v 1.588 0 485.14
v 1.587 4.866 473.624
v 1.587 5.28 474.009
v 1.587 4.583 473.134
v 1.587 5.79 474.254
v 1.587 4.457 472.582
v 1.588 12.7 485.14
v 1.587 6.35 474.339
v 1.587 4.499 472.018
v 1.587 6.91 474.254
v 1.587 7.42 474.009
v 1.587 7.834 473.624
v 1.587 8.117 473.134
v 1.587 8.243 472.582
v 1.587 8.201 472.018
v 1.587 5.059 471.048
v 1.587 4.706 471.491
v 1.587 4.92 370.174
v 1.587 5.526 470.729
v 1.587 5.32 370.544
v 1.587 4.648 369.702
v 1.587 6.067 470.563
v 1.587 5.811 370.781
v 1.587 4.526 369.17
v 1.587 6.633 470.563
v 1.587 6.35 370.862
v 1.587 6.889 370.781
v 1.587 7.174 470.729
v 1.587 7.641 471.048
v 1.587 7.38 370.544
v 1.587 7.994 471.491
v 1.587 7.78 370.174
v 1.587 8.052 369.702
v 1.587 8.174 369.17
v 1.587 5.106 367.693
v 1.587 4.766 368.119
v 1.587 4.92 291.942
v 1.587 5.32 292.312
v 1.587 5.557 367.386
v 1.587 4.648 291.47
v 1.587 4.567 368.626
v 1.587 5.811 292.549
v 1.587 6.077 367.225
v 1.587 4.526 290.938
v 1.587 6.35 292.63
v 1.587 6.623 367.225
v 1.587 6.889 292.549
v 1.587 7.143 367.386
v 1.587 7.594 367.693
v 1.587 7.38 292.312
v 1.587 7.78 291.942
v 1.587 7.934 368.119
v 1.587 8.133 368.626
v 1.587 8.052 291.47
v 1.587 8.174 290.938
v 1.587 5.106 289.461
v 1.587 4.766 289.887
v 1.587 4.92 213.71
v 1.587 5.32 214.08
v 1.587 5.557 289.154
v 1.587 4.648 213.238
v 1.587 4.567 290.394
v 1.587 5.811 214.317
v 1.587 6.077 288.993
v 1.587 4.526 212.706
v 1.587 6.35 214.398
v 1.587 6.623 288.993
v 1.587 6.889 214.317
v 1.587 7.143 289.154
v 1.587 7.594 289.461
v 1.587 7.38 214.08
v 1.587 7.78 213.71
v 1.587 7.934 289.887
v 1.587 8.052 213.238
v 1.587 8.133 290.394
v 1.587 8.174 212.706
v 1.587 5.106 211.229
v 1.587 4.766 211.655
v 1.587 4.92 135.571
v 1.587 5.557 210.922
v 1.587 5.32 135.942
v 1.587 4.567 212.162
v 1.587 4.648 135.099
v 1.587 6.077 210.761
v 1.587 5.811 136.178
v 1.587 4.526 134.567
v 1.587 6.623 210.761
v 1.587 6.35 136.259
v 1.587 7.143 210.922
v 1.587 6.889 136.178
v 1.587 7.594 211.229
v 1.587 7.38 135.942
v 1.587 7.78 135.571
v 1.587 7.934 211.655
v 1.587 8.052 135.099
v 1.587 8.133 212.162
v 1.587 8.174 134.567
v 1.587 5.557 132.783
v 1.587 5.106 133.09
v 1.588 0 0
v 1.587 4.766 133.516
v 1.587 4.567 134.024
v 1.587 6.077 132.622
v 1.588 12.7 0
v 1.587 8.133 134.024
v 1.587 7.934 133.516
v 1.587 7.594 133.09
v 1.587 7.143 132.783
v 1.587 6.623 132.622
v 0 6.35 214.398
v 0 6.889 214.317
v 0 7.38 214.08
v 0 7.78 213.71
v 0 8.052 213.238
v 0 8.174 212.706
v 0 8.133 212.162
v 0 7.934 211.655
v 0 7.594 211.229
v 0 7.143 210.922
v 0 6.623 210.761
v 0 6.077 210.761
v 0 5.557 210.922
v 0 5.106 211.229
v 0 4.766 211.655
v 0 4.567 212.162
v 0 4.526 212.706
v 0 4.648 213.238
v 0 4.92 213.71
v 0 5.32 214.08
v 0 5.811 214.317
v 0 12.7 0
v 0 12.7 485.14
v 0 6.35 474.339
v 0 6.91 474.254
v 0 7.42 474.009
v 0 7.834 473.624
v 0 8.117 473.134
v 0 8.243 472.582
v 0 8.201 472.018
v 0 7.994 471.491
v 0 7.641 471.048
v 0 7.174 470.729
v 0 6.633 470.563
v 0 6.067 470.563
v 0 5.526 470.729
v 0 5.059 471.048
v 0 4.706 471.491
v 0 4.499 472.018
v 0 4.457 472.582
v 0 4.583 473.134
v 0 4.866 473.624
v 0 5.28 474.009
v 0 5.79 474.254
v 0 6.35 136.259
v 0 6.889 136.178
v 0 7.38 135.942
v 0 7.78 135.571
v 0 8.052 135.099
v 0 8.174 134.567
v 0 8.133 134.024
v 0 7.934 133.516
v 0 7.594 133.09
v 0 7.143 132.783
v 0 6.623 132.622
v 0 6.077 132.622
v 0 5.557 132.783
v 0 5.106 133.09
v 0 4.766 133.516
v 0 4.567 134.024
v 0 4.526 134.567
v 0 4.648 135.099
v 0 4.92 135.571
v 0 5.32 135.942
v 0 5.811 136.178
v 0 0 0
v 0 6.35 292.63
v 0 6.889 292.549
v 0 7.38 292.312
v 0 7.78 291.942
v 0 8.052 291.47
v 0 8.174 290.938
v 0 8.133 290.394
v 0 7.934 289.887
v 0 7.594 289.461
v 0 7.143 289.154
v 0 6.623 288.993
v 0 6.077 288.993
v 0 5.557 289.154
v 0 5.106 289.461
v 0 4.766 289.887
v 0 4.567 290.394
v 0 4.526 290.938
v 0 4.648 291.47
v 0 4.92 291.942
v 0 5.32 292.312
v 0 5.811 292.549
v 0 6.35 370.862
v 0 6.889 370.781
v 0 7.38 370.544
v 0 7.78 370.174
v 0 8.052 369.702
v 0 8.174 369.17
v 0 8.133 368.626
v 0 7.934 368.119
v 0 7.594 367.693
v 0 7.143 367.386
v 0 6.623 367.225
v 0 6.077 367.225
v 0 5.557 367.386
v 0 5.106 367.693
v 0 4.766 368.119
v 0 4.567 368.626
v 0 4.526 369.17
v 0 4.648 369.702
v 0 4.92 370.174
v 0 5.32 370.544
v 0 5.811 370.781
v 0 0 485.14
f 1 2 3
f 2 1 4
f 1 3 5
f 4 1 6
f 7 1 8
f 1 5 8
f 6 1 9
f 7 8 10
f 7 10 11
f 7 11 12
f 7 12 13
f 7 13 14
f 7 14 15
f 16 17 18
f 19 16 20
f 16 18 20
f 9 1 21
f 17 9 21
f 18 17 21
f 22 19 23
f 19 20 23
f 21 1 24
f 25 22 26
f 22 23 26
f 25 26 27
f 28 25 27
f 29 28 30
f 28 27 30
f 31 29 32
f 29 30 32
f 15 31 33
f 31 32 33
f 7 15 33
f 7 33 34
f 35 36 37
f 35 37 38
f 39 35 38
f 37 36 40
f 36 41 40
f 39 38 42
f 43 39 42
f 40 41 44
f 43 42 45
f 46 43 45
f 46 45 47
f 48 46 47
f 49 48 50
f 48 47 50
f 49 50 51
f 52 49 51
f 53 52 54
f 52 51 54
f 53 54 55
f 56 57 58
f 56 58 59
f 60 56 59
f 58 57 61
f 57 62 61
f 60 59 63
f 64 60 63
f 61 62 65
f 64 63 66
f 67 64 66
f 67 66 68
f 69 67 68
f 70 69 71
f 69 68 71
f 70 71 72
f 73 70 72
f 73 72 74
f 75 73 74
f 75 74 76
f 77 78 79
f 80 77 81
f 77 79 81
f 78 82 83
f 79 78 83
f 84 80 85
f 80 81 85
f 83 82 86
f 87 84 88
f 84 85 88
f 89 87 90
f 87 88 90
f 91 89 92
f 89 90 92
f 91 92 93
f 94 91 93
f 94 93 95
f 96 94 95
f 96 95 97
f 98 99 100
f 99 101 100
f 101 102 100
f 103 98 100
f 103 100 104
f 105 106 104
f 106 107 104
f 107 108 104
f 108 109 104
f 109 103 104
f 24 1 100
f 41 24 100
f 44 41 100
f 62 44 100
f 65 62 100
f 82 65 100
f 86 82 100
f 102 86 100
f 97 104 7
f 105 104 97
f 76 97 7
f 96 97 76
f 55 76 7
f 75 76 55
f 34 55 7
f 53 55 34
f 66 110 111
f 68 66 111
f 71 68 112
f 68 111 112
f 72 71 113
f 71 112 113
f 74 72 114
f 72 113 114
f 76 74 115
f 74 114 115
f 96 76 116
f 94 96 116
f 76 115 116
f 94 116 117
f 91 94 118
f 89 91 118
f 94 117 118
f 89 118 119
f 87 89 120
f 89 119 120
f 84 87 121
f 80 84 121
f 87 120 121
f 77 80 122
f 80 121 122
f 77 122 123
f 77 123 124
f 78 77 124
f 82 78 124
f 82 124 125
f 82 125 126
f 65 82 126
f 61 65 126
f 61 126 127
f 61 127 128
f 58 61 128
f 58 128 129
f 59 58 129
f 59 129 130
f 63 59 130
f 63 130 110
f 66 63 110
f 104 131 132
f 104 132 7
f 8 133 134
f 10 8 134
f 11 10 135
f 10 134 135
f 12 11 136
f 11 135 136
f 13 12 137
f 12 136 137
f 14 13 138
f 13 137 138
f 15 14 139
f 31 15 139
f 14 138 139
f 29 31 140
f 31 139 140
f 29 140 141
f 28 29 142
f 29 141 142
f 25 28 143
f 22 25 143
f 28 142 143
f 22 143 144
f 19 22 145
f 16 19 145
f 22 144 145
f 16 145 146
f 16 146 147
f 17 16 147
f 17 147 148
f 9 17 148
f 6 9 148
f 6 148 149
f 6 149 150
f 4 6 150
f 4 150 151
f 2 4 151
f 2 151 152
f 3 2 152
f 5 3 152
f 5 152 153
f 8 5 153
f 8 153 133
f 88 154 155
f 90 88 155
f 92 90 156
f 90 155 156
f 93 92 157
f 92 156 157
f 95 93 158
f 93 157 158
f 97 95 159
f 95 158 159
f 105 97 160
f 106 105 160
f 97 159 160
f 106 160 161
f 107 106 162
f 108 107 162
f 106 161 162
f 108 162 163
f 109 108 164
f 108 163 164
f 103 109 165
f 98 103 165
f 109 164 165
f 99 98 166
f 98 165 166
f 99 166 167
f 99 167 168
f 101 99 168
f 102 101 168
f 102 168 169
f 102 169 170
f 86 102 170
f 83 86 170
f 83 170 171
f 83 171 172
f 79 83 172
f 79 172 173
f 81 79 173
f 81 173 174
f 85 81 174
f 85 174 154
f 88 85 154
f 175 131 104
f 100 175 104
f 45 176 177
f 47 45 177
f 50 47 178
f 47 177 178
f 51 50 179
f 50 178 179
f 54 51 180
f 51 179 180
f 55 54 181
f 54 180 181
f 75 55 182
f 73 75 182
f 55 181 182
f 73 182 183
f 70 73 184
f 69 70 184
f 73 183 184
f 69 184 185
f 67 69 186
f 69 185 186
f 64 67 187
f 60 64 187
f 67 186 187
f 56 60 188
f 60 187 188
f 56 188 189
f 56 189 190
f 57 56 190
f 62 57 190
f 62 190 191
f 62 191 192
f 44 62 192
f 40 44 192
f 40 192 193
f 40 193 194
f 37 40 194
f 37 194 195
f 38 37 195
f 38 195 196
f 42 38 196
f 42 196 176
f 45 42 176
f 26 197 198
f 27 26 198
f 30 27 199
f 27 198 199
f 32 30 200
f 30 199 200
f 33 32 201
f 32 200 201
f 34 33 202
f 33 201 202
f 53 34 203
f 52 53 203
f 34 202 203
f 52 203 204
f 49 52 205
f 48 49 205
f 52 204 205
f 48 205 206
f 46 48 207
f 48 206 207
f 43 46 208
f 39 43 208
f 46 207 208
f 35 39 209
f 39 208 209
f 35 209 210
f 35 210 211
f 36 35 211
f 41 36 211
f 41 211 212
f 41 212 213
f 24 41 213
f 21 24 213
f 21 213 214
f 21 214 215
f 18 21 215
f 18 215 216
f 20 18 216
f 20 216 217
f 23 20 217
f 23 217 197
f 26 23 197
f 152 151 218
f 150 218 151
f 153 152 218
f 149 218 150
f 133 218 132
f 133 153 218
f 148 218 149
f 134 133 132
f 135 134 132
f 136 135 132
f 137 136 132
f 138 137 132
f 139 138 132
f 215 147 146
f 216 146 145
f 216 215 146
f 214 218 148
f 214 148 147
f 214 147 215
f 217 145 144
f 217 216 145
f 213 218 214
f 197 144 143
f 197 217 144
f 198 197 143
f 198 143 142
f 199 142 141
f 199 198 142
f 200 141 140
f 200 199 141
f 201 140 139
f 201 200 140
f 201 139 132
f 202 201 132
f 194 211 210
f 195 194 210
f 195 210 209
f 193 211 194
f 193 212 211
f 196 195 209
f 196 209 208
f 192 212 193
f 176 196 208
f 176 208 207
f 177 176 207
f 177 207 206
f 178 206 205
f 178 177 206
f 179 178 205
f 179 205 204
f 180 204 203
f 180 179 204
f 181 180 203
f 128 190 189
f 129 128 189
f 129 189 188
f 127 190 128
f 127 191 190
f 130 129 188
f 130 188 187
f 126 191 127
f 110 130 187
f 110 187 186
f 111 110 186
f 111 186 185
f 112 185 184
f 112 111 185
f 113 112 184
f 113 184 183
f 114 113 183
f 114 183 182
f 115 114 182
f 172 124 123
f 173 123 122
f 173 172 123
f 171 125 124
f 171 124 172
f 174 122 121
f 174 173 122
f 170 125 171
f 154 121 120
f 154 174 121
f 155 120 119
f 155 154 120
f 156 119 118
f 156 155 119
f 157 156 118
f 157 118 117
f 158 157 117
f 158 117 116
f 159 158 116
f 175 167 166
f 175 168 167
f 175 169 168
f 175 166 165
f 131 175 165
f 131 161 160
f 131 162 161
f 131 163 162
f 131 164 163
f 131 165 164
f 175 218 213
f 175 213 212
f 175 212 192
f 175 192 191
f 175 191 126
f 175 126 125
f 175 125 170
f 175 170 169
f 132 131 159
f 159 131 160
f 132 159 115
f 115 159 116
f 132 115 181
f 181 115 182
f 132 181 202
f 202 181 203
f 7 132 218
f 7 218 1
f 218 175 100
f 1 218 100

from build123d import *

# Parameters (mm, degrees)
SKETCH1_W             = 1.5875
SKETCH1_H             = 12.7
BOSS_EXTRUDE1_DEPTH   = 485.14
F_6_CLEARANCE_HOLE1_D = 3.7973
F_6_CLEARANCE_HOLE2_D = 3.6576


with BuildPart() as part:
    # Sketch1 → Boss-Extrude1 (new body)
    with BuildSketch(Plane.XY):
        with Locations((0.79375, 6.35)):
            Rectangle(SKETCH1_W, SKETCH1_H)
    extrude(amount=BOSS_EXTRUDE1_DEPTH)

    # #6 Clearance Hole1 (through all)
    with Locations(Plane(origin=(1.5875, 0, 0), x_dir=(0, 0, -1), z_dir=(1, 0, 0))):
        with Locations((-472.44, 6.35)):
            Hole(F_6_CLEARANCE_HOLE1_D / 2)

    # #6 Clearance Hole2 (through all)
    with Locations(Plane(origin=(7.14375, -24.631267391, -47.650434272), x_dir=(0, 0, -1), z_dir=(1, 0, 0))):
        with Locations((-416.683873726, 30.981267391), (-338.451873726, 30.981267391), (-260.219873726, 30.981267391), (-182.081072585, 30.981267391)):
            Hole(F_6_CLEARANCE_HOLE2_D / 2)


solid = part.part
